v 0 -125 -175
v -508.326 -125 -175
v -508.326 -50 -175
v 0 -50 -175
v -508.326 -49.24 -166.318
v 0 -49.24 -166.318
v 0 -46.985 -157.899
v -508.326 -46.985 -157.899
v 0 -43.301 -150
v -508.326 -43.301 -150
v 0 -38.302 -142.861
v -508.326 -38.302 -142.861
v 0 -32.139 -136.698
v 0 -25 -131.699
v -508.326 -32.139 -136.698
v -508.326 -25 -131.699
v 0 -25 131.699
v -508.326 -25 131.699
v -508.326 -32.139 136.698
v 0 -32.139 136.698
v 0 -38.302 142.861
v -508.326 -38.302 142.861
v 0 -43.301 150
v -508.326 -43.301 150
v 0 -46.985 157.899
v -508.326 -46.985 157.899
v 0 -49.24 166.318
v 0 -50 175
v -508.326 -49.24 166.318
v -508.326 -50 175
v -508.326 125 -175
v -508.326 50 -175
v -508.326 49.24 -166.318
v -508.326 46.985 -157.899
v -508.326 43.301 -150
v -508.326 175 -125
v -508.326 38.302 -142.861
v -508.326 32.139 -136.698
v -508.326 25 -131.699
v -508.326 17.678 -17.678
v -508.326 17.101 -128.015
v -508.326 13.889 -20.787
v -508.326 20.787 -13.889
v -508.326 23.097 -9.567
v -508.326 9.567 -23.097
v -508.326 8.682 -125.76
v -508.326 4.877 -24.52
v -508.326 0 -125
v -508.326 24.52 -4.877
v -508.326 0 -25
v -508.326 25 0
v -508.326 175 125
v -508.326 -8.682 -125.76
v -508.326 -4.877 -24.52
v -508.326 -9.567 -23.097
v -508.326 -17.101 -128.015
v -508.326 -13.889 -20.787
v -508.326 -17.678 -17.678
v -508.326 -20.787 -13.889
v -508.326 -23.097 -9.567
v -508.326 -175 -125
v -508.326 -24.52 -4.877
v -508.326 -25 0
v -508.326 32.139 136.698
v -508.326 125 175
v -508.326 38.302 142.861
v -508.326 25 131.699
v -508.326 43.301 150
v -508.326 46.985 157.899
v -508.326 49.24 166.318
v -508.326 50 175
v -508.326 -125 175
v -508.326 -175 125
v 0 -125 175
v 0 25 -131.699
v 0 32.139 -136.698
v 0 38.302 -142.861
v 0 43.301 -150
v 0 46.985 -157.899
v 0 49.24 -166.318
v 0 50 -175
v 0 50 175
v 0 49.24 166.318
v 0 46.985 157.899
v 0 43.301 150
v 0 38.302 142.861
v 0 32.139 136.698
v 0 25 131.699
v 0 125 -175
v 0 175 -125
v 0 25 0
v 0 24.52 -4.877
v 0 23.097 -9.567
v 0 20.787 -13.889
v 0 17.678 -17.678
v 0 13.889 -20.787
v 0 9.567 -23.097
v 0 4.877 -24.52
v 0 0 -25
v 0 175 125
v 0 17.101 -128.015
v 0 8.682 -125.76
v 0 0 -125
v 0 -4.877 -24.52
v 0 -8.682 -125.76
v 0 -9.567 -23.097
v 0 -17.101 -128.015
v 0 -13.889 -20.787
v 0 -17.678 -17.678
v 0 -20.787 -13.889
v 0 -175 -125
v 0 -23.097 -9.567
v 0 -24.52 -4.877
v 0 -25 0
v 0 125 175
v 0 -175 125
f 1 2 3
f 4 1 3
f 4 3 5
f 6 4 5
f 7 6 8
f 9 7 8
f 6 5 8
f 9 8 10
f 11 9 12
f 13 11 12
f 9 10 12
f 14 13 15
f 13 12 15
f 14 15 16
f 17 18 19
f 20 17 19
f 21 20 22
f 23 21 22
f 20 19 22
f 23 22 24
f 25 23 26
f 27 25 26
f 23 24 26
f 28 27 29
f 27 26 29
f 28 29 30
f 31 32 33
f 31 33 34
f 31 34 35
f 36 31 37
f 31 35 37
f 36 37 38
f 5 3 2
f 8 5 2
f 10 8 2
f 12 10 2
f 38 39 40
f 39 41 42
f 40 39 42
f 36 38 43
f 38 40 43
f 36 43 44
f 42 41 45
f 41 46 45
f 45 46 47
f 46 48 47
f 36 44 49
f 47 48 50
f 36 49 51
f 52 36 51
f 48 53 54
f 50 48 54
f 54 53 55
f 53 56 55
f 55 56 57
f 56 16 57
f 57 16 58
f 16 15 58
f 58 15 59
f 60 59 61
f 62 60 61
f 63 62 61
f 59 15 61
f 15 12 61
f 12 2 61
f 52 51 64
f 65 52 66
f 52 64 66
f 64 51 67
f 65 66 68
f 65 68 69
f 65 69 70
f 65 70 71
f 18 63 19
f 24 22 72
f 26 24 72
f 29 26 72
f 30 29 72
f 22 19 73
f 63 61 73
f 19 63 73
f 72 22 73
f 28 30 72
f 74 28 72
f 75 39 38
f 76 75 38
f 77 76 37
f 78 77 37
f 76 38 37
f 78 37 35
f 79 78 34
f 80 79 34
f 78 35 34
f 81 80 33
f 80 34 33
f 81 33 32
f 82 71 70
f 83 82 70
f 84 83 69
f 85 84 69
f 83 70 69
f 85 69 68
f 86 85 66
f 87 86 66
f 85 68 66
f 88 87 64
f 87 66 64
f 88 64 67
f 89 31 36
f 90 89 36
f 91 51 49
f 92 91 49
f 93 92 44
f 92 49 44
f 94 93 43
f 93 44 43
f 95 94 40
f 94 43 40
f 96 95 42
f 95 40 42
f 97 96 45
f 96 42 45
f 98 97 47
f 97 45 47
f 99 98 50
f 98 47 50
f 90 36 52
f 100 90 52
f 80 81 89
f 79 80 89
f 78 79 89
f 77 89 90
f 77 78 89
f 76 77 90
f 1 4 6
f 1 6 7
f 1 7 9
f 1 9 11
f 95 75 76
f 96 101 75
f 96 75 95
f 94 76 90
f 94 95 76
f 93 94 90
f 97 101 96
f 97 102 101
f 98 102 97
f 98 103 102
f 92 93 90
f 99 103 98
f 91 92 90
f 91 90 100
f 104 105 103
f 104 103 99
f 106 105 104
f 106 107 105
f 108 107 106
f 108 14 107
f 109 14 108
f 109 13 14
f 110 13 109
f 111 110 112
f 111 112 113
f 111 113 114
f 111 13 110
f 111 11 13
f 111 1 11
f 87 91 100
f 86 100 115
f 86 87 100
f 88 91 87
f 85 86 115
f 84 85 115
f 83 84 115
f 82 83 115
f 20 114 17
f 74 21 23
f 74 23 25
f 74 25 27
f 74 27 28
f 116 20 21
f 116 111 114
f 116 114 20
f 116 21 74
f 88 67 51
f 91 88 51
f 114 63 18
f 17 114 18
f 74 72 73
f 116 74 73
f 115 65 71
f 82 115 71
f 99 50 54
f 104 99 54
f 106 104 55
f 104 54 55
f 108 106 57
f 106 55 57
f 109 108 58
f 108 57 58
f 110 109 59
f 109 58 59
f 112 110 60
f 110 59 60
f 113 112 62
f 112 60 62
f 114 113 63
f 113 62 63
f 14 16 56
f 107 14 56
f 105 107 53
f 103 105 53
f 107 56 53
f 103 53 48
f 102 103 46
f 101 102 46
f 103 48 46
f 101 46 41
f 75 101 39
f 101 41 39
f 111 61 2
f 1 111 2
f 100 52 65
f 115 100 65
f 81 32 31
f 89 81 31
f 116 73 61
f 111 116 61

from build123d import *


with BuildPart() as f2:
    # F2: sweep along a path in F1
    with BuildLine(Plane.XZ) as f2_path:
        Line((0, 0), (-508.3263516426, 0))
    # F0 (on Right) → F2 (sweep)
    with BuildSketch(Plane.YZ):
        with BuildLine():
            Line((175, 125), (125, 175))
            Line((125, 175), (50, 175))
            ThreePointArc((50, 175), (43.3012701892, 150), (25, 131.6987298108))
            Line((25, 131.6987298108), (25, 0))
            Line((25, 0), (25, -131.6987298108))
            ThreePointArc((25, -131.6987298108), (43.3012701892, -150), (50, -175))
            Line((50, -175), (125, -175))
            Line((125, -175), (175, -125))
            Line((175, -125), (175, 125))
        make_face()
        with BuildLine():
            Line((25, -131.6987298108), (25, 0))
            ThreePointArc((25, 0), (17.6776695297, -17.6776695297), (0, -25))
            ThreePointArc((0, -25), (-17.6776695297, -17.6776695297), (-25, 0))
            Line((-25, 0), (-25, -131.6987298108))
            ThreePointArc((-25, -131.6987298108), (0, -125), (25, -131.6987298108))
        make_face()
        with BuildLine():
            Line((-25, 0), (-25, 131.6987298108))
            ThreePointArc((-25, 131.6987298108), (-43.3012701892, 150), (-50, 175))
            Line((-50, 175), (-125, 175))
            Line((-125, 175), (-175, 125))
            Line((-175, 125), (-175, -125))
            Line((-175, -125), (-125, -175))
            Line((-125, -175), (-50, -175))
            ThreePointArc((-50, -175), (-43.3012701892, -150), (-25, -131.6987298108))
            Line((-25, -131.6987298108), (-25, 0))
        make_face()
    sweep(path=f2_path.line)


solid = f2.part
